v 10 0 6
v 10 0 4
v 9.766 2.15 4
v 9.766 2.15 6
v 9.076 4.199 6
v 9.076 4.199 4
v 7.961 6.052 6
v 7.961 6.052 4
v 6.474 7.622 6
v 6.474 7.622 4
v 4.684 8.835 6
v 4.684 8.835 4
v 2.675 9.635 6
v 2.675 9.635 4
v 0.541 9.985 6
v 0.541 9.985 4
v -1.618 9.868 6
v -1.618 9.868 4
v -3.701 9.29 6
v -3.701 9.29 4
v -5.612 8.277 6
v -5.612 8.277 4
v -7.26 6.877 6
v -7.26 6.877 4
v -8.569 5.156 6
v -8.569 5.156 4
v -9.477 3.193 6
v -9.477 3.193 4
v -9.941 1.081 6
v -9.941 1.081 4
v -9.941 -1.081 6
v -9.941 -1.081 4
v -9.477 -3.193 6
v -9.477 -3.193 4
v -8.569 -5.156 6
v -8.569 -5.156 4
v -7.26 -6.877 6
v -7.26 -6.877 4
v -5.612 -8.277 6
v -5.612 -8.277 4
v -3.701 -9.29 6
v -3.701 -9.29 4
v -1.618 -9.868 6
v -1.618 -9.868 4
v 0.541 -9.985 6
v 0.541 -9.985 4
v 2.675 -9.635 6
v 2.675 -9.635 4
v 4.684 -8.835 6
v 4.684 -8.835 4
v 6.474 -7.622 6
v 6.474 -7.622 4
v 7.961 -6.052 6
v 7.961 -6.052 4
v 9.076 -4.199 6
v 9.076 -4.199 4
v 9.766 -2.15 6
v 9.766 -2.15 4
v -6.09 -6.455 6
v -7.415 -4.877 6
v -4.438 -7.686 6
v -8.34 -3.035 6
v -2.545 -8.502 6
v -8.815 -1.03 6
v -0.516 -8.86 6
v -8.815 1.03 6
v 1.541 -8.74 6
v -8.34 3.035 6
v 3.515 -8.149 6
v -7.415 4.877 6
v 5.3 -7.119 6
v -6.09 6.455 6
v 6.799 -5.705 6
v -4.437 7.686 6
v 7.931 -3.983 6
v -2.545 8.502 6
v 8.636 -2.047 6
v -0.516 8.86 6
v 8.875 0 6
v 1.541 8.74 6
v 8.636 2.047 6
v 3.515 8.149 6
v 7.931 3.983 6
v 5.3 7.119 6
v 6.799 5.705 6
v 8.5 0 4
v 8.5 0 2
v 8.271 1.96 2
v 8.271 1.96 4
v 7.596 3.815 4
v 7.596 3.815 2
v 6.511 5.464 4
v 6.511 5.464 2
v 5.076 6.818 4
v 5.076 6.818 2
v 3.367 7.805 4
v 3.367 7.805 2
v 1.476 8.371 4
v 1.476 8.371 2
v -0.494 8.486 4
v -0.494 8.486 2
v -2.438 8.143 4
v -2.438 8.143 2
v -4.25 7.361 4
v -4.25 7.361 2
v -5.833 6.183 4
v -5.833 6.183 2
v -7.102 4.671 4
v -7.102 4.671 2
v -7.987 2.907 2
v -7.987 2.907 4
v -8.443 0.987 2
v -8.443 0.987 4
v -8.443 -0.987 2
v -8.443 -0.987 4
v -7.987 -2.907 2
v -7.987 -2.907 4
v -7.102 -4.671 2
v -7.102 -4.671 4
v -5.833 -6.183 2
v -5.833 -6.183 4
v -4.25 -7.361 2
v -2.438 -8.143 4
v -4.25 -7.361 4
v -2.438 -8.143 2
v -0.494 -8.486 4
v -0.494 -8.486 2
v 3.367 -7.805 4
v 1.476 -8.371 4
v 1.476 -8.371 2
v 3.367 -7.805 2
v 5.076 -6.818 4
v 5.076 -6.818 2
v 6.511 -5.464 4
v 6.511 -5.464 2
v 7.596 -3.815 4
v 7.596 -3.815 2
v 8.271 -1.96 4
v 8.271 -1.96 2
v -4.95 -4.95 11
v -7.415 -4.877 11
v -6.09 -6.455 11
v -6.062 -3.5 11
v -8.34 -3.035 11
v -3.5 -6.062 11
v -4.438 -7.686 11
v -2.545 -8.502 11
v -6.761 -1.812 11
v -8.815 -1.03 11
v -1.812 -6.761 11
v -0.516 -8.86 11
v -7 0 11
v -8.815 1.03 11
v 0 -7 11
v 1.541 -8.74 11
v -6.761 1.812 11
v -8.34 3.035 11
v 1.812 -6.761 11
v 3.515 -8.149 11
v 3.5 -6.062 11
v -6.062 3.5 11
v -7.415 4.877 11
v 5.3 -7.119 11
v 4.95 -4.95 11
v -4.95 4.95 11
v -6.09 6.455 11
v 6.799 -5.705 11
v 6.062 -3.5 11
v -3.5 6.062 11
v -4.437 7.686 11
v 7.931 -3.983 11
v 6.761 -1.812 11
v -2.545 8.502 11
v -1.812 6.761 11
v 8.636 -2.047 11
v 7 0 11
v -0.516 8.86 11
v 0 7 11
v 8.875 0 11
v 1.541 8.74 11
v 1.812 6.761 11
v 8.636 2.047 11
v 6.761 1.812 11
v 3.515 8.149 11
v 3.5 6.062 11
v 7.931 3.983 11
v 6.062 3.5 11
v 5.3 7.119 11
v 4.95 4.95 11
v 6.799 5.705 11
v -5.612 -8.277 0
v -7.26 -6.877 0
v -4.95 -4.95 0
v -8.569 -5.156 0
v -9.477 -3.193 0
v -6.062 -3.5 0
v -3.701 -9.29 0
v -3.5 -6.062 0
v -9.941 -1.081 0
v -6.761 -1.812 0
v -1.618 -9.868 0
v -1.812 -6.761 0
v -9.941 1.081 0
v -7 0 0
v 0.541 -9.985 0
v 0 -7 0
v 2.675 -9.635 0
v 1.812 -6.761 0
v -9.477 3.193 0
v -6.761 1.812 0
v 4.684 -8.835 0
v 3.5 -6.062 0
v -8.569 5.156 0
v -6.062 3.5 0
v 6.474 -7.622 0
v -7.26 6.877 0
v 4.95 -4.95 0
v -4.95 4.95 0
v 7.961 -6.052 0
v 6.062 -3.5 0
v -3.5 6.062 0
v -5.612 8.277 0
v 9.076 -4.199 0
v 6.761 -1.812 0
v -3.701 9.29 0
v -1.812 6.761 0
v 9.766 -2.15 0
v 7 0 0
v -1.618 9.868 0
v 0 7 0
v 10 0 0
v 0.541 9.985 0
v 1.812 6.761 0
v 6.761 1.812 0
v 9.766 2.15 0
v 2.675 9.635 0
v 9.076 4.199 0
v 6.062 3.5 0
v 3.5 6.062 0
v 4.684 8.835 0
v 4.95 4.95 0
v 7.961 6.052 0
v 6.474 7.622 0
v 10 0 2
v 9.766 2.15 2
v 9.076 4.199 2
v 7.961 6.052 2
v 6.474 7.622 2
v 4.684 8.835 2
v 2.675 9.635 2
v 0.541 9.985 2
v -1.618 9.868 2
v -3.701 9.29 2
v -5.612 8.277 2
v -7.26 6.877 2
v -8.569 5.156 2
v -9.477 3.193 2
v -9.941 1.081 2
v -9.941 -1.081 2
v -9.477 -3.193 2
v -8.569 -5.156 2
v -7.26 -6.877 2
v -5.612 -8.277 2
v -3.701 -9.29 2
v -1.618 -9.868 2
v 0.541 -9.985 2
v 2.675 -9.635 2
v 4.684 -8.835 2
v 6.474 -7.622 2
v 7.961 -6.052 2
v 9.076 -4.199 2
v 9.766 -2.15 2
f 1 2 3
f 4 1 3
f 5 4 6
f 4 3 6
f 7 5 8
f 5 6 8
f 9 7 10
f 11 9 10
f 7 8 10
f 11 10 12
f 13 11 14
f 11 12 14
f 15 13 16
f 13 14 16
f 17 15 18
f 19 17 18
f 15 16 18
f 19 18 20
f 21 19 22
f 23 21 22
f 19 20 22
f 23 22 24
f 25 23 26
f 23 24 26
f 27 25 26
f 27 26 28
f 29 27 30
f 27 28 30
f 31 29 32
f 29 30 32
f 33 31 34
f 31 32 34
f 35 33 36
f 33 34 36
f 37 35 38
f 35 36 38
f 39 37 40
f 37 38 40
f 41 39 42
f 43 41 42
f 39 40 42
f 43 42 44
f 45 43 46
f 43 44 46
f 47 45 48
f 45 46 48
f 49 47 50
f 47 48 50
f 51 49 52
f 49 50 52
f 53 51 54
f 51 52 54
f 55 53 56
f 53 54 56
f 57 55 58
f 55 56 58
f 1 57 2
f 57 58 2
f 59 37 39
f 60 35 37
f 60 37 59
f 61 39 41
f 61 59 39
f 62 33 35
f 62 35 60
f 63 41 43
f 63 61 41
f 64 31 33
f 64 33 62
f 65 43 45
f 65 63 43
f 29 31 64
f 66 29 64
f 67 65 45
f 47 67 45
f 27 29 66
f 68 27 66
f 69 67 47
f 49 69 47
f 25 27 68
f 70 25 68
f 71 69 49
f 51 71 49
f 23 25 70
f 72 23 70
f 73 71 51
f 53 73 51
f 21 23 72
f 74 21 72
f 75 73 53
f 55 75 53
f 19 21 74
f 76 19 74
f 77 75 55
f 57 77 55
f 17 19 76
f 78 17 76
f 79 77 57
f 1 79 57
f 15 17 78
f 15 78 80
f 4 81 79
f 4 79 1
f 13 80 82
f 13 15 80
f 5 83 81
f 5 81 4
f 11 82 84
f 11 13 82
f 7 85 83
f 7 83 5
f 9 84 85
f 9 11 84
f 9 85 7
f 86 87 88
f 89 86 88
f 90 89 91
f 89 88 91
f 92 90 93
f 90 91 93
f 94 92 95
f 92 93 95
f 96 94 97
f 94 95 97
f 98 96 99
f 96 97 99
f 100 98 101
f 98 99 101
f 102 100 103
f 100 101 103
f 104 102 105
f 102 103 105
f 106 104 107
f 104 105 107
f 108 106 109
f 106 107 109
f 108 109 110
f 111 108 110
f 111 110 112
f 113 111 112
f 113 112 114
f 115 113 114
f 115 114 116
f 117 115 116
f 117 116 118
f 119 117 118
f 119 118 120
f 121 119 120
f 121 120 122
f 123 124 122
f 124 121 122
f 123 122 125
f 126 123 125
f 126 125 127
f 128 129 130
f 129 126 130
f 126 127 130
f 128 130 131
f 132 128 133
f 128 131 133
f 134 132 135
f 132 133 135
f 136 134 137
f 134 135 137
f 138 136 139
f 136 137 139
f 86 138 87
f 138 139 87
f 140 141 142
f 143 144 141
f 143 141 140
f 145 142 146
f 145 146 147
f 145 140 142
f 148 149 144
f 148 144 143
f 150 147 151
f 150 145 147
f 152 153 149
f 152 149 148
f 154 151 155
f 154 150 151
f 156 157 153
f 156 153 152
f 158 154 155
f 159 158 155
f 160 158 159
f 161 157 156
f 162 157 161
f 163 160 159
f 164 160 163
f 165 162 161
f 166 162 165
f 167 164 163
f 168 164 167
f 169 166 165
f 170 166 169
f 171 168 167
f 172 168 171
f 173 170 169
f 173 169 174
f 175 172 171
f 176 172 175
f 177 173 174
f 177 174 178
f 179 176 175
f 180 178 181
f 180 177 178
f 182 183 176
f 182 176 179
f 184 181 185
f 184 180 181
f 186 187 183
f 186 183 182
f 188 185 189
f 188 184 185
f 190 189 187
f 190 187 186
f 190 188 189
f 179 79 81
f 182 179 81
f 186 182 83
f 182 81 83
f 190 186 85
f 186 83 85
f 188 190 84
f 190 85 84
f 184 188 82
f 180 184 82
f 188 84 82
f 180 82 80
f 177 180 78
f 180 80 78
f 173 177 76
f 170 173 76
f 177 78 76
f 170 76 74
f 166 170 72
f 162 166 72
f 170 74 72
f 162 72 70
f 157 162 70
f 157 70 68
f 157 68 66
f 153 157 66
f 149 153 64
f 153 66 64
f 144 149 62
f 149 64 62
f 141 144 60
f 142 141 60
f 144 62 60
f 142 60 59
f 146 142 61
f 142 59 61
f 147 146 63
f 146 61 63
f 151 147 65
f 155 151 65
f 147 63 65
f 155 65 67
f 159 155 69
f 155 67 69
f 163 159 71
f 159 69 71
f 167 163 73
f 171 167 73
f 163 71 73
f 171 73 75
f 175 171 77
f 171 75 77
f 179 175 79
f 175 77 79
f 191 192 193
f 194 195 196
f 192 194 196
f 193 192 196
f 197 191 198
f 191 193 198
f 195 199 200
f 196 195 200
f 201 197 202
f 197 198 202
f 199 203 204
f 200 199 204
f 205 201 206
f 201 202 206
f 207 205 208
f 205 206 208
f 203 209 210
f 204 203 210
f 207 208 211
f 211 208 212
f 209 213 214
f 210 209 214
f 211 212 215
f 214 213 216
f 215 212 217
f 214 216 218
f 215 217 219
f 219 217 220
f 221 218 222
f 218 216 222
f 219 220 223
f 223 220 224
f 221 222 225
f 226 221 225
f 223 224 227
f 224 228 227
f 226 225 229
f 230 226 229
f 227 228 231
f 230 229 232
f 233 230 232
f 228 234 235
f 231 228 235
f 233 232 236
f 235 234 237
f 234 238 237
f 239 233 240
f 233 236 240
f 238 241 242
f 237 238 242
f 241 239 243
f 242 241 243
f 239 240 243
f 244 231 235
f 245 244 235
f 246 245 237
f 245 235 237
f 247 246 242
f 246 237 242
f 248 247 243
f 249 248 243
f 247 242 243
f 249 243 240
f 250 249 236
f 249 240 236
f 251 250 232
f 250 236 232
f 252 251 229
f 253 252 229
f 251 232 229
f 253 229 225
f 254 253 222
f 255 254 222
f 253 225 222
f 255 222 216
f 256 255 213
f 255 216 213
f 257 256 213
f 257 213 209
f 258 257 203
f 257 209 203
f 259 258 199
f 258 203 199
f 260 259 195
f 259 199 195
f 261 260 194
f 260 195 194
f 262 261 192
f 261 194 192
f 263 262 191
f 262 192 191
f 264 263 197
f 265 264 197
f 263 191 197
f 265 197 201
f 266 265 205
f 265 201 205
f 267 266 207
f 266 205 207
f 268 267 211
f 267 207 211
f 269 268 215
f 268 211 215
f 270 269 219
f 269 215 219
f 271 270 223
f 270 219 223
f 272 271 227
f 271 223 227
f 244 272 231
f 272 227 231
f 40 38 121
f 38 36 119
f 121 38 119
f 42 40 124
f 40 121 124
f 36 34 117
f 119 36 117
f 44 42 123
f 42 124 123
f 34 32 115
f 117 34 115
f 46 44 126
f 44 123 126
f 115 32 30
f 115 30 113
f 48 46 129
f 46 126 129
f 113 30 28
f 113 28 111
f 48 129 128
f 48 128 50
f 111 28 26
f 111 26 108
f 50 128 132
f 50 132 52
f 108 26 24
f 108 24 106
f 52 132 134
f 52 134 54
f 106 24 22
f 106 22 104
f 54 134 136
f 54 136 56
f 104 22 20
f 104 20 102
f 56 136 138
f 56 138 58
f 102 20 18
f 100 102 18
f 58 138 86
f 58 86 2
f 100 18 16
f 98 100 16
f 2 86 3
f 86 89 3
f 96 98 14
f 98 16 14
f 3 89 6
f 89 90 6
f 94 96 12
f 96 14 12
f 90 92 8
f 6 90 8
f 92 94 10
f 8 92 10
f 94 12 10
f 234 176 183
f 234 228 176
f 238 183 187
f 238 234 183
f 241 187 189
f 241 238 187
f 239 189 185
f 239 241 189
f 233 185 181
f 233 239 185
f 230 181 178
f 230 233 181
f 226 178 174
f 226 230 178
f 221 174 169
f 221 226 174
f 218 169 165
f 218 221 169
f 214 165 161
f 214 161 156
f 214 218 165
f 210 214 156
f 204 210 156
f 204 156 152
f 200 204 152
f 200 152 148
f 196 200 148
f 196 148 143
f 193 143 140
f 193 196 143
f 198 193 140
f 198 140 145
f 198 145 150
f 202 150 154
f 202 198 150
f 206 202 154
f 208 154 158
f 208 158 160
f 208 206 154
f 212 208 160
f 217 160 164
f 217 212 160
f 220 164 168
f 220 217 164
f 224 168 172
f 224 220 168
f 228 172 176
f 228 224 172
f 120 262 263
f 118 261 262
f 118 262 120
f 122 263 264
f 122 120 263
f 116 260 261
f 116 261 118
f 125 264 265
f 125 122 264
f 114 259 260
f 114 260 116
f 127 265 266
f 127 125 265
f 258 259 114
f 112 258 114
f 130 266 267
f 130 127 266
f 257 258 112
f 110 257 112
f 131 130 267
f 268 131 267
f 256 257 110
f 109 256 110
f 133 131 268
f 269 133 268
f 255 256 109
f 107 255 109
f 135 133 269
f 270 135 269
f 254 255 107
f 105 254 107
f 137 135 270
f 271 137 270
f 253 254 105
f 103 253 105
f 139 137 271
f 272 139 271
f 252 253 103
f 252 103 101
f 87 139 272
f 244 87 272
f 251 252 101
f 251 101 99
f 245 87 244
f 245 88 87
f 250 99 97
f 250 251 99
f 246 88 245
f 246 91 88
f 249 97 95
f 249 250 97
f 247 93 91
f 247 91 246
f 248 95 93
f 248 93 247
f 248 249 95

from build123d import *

# Parameters (mm, degrees)
SKETCH1_R           = 10
BOSS_EXTRUDE1_DEPTH = 2
SKETCH2_R           = 8.5
BOSS_EXTRUDE2_DEPTH = 6
BOSS_EXTRUDE3_START = 4
SKETCH3_R           = 10
BOSS_EXTRUDE3_DEPTH = 2
SKETCH5_R           = 7
CUT_EXTRUDE2_DEPTH  = 16.362291496
BOSS_EXTRUDE4_START = 6
SKETCH6_R           = 8.875
SKETCH6_R_2         = 7
BOSS_EXTRUDE4_DEPTH = 5


with BuildPart() as part:
    # Sketch1 → Boss-Extrude1 (new body)
    with BuildSketch(Plane.XY):
        Circle(SKETCH1_R)
    extrude(amount=BOSS_EXTRUDE1_DEPTH)

    # Sketch2 → Boss-Extrude2 (add)
    with BuildSketch(Plane.XY):
        Circle(SKETCH2_R)
    extrude(amount=BOSS_EXTRUDE2_DEPTH)

    # Sketch3 → Boss-Extrude3 (add)
    with BuildSketch(Plane.XY.offset(BOSS_EXTRUDE3_START)):
        Circle(SKETCH3_R)
    extrude(amount=BOSS_EXTRUDE3_DEPTH)

    # Sketch5 → Cut-Extrude2 (cut, through all)
    with BuildSketch(Plane.XY):
        Circle(SKETCH5_R)
    extrude(amount=CUT_EXTRUDE2_DEPTH, mode=Mode.SUBTRACT)

    # Sketch6 → Boss-Extrude4 (add)
    with BuildSketch(Plane.XY.offset(BOSS_EXTRUDE4_START)):
        Circle(SKETCH6_R)
        Circle(SKETCH6_R_2, mode=Mode.SUBTRACT)
    extrude(amount=BOSS_EXTRUDE4_DEPTH)


solid = part.part
